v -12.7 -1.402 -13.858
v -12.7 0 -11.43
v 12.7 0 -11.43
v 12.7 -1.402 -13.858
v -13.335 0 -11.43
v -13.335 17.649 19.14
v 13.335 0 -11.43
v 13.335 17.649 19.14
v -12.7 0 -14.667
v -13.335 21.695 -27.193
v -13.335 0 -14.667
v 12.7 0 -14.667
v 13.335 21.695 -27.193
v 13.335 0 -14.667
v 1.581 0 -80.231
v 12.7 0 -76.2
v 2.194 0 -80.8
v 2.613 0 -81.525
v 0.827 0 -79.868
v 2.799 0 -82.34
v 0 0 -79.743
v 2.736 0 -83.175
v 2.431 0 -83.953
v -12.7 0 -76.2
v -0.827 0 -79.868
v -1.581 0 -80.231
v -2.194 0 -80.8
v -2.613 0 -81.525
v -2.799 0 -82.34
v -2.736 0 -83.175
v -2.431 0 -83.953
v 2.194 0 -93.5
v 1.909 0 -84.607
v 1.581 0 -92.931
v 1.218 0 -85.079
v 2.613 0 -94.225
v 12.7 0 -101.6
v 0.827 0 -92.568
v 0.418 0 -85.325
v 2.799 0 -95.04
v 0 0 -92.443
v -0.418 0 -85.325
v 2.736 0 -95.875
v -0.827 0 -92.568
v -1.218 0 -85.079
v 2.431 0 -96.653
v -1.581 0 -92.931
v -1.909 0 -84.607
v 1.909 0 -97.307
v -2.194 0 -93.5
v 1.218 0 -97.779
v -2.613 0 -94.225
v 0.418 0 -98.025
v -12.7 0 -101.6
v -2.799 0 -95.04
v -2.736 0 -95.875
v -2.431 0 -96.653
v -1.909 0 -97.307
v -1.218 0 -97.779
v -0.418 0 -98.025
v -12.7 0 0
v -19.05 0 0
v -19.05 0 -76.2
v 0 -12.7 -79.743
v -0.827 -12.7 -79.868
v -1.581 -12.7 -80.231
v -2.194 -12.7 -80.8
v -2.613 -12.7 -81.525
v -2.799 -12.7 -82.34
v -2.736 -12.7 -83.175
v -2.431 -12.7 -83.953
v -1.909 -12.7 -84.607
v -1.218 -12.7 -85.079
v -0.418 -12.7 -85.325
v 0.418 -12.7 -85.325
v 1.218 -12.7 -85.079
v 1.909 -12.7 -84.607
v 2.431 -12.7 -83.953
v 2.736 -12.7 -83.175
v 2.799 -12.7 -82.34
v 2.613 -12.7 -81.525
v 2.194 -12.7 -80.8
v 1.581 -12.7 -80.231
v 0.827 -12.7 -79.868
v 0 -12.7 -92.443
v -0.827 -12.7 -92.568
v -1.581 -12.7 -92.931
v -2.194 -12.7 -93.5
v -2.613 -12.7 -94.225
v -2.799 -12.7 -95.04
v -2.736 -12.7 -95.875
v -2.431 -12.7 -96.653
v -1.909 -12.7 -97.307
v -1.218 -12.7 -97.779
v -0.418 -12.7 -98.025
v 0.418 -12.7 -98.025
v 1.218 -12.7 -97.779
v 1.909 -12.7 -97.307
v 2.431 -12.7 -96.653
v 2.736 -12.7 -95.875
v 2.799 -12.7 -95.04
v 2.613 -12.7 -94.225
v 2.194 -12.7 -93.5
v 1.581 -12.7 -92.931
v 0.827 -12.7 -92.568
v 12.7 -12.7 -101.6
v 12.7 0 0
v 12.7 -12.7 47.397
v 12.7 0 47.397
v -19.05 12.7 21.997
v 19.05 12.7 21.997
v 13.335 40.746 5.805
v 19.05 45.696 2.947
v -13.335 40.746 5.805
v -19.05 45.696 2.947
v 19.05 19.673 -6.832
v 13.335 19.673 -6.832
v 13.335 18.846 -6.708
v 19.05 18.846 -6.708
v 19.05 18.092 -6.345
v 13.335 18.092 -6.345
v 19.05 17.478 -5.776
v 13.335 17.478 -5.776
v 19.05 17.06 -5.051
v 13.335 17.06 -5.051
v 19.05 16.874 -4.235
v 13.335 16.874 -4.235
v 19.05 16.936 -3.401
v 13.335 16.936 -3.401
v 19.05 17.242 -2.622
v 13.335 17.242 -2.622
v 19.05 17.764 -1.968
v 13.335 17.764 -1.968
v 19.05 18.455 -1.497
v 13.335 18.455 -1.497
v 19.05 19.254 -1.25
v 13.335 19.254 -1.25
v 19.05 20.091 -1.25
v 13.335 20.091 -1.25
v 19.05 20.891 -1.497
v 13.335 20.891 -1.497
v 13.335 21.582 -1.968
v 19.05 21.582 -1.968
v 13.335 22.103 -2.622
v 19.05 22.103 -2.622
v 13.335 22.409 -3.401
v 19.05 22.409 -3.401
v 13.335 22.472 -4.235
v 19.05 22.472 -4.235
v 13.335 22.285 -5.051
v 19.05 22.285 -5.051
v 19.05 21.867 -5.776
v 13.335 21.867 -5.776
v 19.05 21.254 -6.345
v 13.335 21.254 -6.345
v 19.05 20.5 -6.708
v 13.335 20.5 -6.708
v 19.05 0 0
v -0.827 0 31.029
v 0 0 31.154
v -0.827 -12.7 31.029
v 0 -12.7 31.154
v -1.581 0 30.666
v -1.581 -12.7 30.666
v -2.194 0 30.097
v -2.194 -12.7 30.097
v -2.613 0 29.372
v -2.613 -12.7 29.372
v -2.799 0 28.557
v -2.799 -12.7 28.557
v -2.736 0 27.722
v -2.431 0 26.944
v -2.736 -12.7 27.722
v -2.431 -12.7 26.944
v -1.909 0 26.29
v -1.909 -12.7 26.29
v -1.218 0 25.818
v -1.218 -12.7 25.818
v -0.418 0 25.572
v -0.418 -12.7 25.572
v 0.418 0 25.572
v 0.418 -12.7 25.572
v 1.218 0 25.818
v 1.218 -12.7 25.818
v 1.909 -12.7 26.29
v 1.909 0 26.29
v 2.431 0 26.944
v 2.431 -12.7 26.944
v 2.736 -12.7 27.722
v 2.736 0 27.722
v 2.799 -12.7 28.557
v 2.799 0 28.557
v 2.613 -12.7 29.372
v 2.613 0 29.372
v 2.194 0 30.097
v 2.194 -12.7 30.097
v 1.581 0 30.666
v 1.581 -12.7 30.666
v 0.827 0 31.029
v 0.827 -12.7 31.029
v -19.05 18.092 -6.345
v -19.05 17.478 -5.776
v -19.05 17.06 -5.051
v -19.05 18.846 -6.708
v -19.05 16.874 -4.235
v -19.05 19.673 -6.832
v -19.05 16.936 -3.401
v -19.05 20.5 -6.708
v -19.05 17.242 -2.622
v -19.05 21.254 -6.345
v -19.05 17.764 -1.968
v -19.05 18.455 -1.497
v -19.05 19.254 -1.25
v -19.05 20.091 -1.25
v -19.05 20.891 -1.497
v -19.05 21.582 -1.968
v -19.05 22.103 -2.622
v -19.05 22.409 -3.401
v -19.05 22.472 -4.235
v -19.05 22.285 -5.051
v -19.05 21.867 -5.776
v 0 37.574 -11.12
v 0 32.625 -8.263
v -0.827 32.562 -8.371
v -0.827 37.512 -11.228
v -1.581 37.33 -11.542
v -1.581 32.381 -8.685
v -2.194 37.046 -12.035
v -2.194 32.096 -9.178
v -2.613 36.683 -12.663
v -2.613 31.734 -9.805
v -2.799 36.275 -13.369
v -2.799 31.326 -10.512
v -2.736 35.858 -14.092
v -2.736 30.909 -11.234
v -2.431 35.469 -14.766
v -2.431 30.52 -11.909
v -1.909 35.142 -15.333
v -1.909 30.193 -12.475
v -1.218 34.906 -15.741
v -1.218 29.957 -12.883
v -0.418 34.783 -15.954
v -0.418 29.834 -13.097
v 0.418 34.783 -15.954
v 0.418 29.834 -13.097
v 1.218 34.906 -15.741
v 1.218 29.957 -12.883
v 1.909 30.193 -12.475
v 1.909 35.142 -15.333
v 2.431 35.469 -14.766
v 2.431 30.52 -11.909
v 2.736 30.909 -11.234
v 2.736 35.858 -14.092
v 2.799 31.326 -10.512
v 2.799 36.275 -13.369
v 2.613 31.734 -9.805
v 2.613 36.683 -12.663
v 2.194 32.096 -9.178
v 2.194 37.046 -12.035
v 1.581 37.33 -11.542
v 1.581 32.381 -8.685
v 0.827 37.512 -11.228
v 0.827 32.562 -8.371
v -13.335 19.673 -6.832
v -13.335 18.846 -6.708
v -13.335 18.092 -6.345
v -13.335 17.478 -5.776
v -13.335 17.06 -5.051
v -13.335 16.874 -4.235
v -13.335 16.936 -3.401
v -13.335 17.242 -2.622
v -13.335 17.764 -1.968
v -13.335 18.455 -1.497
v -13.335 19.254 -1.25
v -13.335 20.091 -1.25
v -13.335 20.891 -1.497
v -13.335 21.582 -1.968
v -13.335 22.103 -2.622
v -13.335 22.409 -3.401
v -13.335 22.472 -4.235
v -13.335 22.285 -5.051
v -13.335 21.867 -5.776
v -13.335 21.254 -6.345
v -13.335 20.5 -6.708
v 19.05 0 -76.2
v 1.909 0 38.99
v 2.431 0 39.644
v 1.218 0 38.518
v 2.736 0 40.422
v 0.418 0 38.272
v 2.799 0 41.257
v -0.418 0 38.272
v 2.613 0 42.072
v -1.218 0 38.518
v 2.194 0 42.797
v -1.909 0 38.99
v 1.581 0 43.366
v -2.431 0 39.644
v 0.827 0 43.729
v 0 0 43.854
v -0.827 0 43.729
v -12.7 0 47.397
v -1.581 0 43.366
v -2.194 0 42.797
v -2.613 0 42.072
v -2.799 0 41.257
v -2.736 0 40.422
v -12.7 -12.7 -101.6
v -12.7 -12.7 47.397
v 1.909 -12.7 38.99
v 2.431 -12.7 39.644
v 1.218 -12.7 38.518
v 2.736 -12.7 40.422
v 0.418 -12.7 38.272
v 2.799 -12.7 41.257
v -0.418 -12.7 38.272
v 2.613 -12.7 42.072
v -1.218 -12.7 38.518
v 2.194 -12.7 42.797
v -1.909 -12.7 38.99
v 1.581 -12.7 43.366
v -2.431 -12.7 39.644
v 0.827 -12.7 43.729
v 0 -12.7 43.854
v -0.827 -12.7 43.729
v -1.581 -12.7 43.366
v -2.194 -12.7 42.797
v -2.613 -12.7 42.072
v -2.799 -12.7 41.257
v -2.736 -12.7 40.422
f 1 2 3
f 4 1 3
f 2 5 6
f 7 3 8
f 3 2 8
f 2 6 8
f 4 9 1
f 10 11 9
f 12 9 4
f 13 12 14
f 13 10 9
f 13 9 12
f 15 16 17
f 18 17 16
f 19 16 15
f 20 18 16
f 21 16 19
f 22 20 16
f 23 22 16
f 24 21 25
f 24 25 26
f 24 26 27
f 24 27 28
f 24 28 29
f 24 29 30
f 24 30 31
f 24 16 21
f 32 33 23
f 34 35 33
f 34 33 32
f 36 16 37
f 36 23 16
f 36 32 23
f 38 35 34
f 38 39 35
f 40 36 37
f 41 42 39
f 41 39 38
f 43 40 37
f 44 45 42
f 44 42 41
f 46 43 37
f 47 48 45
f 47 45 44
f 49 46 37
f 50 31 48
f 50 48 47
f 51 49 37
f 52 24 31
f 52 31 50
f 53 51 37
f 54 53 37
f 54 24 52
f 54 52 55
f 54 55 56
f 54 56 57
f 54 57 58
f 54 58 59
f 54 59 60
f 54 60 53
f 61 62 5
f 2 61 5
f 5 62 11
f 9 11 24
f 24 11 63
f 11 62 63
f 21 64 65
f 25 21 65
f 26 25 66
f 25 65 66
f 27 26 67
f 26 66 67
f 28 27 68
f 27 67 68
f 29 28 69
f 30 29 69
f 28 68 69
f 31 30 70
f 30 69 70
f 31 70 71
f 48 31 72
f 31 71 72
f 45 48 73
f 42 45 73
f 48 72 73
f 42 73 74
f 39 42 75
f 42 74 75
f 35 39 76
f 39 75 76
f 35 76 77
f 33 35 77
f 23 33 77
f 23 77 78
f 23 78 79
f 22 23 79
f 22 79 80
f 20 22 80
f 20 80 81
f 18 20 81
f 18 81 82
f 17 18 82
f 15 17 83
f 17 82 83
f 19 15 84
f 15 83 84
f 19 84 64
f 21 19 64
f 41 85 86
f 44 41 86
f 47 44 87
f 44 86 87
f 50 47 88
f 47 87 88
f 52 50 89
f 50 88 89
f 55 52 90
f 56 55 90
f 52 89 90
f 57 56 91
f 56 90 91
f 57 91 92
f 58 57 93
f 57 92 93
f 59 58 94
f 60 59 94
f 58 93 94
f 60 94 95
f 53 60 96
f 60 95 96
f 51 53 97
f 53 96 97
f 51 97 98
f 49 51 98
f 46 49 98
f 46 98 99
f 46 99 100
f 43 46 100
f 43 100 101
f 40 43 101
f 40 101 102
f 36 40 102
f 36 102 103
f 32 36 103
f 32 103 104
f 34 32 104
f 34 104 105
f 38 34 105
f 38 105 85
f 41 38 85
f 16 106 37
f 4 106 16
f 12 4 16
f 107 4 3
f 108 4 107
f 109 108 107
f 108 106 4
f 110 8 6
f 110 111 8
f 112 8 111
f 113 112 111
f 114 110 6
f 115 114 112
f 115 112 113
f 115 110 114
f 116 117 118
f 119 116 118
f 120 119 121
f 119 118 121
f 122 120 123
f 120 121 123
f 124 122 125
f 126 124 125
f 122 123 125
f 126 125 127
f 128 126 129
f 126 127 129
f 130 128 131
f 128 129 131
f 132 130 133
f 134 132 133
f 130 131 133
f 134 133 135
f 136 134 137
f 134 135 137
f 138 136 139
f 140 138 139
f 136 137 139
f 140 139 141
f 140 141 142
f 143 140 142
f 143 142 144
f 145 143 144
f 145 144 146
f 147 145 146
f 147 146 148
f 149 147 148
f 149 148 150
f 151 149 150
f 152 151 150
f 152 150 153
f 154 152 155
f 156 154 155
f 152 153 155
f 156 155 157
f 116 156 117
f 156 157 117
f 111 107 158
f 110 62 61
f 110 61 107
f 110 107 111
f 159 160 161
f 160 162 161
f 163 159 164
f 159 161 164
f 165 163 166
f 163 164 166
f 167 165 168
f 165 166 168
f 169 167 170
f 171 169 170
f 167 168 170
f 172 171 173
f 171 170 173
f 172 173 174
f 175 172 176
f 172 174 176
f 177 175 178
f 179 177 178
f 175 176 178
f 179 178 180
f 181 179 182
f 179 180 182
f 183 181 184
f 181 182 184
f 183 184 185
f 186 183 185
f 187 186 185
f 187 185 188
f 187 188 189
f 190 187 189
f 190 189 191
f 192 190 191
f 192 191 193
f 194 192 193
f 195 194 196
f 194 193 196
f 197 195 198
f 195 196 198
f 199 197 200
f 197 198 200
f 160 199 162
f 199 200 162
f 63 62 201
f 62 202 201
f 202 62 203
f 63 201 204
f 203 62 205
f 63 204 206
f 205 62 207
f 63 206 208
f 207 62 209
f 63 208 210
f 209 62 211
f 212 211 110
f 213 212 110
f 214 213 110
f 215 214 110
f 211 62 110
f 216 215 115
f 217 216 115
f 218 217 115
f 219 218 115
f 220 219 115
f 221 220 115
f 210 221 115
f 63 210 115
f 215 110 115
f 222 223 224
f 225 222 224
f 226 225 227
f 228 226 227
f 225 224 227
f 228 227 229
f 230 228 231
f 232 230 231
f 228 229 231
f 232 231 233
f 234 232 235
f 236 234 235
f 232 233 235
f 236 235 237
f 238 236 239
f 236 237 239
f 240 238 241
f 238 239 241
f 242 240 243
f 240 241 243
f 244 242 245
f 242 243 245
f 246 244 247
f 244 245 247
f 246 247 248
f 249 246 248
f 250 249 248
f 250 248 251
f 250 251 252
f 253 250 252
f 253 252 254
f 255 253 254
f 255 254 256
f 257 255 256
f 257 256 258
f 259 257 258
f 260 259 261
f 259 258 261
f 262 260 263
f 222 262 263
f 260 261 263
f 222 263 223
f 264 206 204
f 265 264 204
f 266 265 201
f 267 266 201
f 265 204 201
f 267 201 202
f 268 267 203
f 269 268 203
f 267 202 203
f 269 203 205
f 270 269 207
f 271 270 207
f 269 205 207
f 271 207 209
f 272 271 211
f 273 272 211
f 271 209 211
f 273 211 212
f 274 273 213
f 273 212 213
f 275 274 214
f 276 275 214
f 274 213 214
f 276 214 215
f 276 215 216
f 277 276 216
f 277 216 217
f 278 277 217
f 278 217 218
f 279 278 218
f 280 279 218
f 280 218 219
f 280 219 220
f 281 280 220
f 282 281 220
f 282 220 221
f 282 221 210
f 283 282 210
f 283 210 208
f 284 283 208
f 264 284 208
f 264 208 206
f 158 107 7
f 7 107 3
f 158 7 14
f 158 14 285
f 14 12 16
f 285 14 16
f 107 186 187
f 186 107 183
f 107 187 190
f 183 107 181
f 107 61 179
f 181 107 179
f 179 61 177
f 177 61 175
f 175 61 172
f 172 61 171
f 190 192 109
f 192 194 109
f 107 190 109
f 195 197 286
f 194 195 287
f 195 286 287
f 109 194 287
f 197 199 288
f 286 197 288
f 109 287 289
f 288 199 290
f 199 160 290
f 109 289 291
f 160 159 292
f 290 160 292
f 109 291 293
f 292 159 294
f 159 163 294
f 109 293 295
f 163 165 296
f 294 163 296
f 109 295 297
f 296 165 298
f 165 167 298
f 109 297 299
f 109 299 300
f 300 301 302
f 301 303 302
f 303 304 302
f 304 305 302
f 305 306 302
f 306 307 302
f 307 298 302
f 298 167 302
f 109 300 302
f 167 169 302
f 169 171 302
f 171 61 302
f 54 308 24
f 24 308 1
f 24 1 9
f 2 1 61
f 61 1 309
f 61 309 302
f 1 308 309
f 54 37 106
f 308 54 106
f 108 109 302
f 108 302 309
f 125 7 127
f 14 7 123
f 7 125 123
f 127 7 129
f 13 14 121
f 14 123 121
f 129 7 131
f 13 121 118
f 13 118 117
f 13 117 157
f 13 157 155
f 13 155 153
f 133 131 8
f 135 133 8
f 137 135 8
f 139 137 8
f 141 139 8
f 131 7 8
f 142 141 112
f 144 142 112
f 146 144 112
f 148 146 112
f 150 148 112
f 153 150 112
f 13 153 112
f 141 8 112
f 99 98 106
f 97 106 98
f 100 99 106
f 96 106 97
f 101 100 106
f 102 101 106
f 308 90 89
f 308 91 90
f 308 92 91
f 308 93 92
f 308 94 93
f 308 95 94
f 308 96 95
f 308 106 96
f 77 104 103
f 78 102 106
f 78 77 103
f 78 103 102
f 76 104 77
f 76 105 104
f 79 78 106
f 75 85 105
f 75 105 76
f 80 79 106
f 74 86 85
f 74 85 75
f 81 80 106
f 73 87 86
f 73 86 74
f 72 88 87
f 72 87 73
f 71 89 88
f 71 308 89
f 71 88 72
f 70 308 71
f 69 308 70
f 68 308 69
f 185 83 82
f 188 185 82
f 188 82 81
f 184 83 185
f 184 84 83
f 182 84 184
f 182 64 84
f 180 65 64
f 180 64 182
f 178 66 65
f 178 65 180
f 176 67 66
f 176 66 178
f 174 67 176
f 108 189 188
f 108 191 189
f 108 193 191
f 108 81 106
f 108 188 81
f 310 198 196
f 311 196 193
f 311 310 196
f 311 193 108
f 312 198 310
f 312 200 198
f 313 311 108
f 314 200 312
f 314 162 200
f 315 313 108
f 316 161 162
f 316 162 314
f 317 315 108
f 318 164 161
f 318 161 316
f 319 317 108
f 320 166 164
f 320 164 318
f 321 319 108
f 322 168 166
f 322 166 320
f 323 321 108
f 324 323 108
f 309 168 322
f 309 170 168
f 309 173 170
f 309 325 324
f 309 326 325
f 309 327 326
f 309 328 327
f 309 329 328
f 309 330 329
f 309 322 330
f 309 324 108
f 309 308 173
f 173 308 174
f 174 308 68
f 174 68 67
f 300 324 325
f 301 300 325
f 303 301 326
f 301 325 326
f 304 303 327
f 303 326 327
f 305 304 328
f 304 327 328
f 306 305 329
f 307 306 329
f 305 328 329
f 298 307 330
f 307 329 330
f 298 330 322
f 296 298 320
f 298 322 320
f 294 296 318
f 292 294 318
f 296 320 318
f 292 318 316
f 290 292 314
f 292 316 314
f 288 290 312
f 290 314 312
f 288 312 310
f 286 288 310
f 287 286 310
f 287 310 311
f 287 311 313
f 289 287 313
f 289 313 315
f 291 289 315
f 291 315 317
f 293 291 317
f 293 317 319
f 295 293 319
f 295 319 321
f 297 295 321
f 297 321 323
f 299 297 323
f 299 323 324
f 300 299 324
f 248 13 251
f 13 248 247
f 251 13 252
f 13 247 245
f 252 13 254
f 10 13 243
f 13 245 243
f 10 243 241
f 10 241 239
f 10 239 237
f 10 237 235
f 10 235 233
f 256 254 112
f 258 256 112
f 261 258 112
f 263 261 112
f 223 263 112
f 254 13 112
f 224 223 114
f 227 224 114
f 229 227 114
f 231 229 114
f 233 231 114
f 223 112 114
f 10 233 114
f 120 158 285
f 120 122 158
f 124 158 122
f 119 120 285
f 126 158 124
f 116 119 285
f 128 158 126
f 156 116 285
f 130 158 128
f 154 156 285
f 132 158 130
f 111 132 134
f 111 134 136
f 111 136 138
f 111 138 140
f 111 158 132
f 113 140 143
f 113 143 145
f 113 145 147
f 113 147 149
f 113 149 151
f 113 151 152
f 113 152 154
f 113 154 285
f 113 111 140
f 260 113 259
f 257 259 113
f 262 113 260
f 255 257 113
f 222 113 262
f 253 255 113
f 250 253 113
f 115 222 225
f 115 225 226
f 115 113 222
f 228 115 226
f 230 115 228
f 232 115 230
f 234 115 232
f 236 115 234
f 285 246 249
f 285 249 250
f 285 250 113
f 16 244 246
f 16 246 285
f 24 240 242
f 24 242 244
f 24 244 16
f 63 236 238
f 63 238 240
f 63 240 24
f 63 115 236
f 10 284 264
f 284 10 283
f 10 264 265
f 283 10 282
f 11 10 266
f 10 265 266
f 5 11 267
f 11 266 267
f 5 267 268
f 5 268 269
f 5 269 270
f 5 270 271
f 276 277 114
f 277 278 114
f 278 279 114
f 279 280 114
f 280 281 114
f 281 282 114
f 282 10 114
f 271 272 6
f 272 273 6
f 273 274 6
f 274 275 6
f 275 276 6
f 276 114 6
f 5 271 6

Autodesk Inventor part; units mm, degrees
ref_plane "YZ Plane" through (0, 0, 0) normal (1, 0, 0) x (0, 1, 0)
ref_plane "XZ Plane" through (0, 0, 0) normal (0, 1, 0) x (-1, 0, 0)
ref_plane "XY Plane" through (0, 0, 0) normal (0, 0, 1) x (1, 0, 0)
sketch "Sketch1" plane through (0, 0, 0) normal (1, 0, 0) x (0, 1, 0)
  line L0 (0, 0) -> (12.7, 21.997)
  line L1 (0, 0) -> (0, 47.397)
  line L2 (0, 0) -> (0, -101.6)
  line L3 (12.7, 21.997) -> (45.6956, 2.947)
  line L4 (45.6956, 2.947) -> (0, -76.2)
  line L5 (12.7, 21.997) -> (0, 21.997) construction
  line L6 (0, 47.397) -> (-12.7, 47.397)
  line L7 (-12.7, 47.397) -> (-12.7, -76.2)
  line L8 (0, -101.6) -> (-12.7, -101.6)
  line L9 (-12.7, -101.6) -> (-12.7, -76.2)
  dimension "d0" = 38.1
  dimension "d1" = 25.4
  dimension "d6" = 30
  dimension "d7" = 25.4
  dimension "d21" = 25.4
  dimension "d22" = 12.7
extrude "Extrusion2" add sketch "Sketch1" along normal mid plane 38.1 contours L0 L3 L4 L2
extrude "Extrusion3" add sketch "Sketch1" along normal mid plane 25.4
sketch "Sketch2" plane through (-19.05, 12.7, 21.997) normal (0, 0.5, 0.8660254) x (1, 0, 0)
  line L0 (32.385, 5.715) -> (32.385, 32.385)
  line L1 (32.385, 32.385) -> (5.715, 32.385)
  line L2 (5.715, 32.385) -> (5.715, 5.715)
  line L3 (5.715, 5.715) -> (32.385, 5.715)
  line L4 (32.385, 5.715) -> (5.715, 32.385) construction
  line L5 (32.385, 32.385) -> (5.715, 5.715) construction
  line L6 (0, 0) -> (0, 38.1) projected
  line L7 (38.1, 38.1) -> (38.1, 0) projected
  line L8 (0, 38.1) -> (38.1, 38.1) projected
  point P0 (19.05, 0)
  point P1 (19.05, 19.05)
  dimension "d16" = 26.67
  dimension "d17" = 19.05
  dimension "d18" = 19.05
extrude "Extrusion4" cut sketch "Sketch2" against normal blind 38.1
sketch "Sketch3" plane through (-12.7, 0, 47.397) normal (0, 1, 0) x (1, 0, 0)
  point P0 (12.7, 47.397)
sketch "Sketch4" plane through (-12.7, 0, 47.397) normal (0, 1, 0) x (1, 0, 0)
  line L0 (25.4, 0) -> (0, 0) projected
  line L1 (-6.35, 25.4) -> (31.75, 25.4) projected
  line L2 (0, 123.597) -> (25.4, 123.597) projected
  line L3 (25.4, 148.997) -> (0, 148.997) projected
  point P0 (12.7, 47.397)
  point P1 (12.7, 6.35)
  point P2 (12.7, 19.05)
  point P3 (12.7, 129.947)
  point P4 (12.7, 142.647)
  dimension "d23" = 6.35
  dimension "d24" = 6.35
  dimension "d25" = 6.35
  dimension "d26" = 6.35
hole "Hole1" at (0, 0, 41.047) at (0, 0, 28.347) at (0, 0, -82.55) at (0, 0, -95.25) direction (0, -1, 0) diameter 5.6134 end through all clearance for "Flat Head Machine Screw (82)" size "#10" standard "Ansi Unified Screw Threads"
sketch "Sketch5" plane through (19.05, 0, 0) normal (1, 0, 0) x (0, 0, -1)
  line L0 (-21.997, 12.7) -> (-2.947, 45.6956) construction
  line L1 (-12.472, 29.1978) -> (38.1, 0) construction
  line L2 (0, 0) -> (76.2, 0) construction
  line L3 (-21.997, 12.7) -> (0, 0) construction
  point P0 (4.0257, 19.6728)
  dimension "d34" = 19.05
sketch "Sketch6" plane through (-19.05, 45.6956, 2.947) normal (0, 0.8660254, -0.5) x (1, 0, 0)
  line L0 (0, 0) -> (38.1, 0) projected
  point P0 (19.05, 25.4)
  point P1 (19.05, 19.05)
  dimension "d35" = 19.05
hole "Hole2" at (0, 36.1706, -13.5507) direction (0, -0.8660254, 0.5) diameter 5.6134 depth 5.715 clearance for "Flat Head Machine Screw (82)" size "#10" standard "Ansi Unified Screw Threads"
hole "Hole3" at (19.05, 19.6728, -4.0257) direction (-1, 0, 0) diameter 5.6134 end through all clearance for "Flat Head Machine Screw (82)" size "#10" standard "Ansi Unified Screw Threads"
properties part number "30degreeAttachement" material "PBT Plastic"
